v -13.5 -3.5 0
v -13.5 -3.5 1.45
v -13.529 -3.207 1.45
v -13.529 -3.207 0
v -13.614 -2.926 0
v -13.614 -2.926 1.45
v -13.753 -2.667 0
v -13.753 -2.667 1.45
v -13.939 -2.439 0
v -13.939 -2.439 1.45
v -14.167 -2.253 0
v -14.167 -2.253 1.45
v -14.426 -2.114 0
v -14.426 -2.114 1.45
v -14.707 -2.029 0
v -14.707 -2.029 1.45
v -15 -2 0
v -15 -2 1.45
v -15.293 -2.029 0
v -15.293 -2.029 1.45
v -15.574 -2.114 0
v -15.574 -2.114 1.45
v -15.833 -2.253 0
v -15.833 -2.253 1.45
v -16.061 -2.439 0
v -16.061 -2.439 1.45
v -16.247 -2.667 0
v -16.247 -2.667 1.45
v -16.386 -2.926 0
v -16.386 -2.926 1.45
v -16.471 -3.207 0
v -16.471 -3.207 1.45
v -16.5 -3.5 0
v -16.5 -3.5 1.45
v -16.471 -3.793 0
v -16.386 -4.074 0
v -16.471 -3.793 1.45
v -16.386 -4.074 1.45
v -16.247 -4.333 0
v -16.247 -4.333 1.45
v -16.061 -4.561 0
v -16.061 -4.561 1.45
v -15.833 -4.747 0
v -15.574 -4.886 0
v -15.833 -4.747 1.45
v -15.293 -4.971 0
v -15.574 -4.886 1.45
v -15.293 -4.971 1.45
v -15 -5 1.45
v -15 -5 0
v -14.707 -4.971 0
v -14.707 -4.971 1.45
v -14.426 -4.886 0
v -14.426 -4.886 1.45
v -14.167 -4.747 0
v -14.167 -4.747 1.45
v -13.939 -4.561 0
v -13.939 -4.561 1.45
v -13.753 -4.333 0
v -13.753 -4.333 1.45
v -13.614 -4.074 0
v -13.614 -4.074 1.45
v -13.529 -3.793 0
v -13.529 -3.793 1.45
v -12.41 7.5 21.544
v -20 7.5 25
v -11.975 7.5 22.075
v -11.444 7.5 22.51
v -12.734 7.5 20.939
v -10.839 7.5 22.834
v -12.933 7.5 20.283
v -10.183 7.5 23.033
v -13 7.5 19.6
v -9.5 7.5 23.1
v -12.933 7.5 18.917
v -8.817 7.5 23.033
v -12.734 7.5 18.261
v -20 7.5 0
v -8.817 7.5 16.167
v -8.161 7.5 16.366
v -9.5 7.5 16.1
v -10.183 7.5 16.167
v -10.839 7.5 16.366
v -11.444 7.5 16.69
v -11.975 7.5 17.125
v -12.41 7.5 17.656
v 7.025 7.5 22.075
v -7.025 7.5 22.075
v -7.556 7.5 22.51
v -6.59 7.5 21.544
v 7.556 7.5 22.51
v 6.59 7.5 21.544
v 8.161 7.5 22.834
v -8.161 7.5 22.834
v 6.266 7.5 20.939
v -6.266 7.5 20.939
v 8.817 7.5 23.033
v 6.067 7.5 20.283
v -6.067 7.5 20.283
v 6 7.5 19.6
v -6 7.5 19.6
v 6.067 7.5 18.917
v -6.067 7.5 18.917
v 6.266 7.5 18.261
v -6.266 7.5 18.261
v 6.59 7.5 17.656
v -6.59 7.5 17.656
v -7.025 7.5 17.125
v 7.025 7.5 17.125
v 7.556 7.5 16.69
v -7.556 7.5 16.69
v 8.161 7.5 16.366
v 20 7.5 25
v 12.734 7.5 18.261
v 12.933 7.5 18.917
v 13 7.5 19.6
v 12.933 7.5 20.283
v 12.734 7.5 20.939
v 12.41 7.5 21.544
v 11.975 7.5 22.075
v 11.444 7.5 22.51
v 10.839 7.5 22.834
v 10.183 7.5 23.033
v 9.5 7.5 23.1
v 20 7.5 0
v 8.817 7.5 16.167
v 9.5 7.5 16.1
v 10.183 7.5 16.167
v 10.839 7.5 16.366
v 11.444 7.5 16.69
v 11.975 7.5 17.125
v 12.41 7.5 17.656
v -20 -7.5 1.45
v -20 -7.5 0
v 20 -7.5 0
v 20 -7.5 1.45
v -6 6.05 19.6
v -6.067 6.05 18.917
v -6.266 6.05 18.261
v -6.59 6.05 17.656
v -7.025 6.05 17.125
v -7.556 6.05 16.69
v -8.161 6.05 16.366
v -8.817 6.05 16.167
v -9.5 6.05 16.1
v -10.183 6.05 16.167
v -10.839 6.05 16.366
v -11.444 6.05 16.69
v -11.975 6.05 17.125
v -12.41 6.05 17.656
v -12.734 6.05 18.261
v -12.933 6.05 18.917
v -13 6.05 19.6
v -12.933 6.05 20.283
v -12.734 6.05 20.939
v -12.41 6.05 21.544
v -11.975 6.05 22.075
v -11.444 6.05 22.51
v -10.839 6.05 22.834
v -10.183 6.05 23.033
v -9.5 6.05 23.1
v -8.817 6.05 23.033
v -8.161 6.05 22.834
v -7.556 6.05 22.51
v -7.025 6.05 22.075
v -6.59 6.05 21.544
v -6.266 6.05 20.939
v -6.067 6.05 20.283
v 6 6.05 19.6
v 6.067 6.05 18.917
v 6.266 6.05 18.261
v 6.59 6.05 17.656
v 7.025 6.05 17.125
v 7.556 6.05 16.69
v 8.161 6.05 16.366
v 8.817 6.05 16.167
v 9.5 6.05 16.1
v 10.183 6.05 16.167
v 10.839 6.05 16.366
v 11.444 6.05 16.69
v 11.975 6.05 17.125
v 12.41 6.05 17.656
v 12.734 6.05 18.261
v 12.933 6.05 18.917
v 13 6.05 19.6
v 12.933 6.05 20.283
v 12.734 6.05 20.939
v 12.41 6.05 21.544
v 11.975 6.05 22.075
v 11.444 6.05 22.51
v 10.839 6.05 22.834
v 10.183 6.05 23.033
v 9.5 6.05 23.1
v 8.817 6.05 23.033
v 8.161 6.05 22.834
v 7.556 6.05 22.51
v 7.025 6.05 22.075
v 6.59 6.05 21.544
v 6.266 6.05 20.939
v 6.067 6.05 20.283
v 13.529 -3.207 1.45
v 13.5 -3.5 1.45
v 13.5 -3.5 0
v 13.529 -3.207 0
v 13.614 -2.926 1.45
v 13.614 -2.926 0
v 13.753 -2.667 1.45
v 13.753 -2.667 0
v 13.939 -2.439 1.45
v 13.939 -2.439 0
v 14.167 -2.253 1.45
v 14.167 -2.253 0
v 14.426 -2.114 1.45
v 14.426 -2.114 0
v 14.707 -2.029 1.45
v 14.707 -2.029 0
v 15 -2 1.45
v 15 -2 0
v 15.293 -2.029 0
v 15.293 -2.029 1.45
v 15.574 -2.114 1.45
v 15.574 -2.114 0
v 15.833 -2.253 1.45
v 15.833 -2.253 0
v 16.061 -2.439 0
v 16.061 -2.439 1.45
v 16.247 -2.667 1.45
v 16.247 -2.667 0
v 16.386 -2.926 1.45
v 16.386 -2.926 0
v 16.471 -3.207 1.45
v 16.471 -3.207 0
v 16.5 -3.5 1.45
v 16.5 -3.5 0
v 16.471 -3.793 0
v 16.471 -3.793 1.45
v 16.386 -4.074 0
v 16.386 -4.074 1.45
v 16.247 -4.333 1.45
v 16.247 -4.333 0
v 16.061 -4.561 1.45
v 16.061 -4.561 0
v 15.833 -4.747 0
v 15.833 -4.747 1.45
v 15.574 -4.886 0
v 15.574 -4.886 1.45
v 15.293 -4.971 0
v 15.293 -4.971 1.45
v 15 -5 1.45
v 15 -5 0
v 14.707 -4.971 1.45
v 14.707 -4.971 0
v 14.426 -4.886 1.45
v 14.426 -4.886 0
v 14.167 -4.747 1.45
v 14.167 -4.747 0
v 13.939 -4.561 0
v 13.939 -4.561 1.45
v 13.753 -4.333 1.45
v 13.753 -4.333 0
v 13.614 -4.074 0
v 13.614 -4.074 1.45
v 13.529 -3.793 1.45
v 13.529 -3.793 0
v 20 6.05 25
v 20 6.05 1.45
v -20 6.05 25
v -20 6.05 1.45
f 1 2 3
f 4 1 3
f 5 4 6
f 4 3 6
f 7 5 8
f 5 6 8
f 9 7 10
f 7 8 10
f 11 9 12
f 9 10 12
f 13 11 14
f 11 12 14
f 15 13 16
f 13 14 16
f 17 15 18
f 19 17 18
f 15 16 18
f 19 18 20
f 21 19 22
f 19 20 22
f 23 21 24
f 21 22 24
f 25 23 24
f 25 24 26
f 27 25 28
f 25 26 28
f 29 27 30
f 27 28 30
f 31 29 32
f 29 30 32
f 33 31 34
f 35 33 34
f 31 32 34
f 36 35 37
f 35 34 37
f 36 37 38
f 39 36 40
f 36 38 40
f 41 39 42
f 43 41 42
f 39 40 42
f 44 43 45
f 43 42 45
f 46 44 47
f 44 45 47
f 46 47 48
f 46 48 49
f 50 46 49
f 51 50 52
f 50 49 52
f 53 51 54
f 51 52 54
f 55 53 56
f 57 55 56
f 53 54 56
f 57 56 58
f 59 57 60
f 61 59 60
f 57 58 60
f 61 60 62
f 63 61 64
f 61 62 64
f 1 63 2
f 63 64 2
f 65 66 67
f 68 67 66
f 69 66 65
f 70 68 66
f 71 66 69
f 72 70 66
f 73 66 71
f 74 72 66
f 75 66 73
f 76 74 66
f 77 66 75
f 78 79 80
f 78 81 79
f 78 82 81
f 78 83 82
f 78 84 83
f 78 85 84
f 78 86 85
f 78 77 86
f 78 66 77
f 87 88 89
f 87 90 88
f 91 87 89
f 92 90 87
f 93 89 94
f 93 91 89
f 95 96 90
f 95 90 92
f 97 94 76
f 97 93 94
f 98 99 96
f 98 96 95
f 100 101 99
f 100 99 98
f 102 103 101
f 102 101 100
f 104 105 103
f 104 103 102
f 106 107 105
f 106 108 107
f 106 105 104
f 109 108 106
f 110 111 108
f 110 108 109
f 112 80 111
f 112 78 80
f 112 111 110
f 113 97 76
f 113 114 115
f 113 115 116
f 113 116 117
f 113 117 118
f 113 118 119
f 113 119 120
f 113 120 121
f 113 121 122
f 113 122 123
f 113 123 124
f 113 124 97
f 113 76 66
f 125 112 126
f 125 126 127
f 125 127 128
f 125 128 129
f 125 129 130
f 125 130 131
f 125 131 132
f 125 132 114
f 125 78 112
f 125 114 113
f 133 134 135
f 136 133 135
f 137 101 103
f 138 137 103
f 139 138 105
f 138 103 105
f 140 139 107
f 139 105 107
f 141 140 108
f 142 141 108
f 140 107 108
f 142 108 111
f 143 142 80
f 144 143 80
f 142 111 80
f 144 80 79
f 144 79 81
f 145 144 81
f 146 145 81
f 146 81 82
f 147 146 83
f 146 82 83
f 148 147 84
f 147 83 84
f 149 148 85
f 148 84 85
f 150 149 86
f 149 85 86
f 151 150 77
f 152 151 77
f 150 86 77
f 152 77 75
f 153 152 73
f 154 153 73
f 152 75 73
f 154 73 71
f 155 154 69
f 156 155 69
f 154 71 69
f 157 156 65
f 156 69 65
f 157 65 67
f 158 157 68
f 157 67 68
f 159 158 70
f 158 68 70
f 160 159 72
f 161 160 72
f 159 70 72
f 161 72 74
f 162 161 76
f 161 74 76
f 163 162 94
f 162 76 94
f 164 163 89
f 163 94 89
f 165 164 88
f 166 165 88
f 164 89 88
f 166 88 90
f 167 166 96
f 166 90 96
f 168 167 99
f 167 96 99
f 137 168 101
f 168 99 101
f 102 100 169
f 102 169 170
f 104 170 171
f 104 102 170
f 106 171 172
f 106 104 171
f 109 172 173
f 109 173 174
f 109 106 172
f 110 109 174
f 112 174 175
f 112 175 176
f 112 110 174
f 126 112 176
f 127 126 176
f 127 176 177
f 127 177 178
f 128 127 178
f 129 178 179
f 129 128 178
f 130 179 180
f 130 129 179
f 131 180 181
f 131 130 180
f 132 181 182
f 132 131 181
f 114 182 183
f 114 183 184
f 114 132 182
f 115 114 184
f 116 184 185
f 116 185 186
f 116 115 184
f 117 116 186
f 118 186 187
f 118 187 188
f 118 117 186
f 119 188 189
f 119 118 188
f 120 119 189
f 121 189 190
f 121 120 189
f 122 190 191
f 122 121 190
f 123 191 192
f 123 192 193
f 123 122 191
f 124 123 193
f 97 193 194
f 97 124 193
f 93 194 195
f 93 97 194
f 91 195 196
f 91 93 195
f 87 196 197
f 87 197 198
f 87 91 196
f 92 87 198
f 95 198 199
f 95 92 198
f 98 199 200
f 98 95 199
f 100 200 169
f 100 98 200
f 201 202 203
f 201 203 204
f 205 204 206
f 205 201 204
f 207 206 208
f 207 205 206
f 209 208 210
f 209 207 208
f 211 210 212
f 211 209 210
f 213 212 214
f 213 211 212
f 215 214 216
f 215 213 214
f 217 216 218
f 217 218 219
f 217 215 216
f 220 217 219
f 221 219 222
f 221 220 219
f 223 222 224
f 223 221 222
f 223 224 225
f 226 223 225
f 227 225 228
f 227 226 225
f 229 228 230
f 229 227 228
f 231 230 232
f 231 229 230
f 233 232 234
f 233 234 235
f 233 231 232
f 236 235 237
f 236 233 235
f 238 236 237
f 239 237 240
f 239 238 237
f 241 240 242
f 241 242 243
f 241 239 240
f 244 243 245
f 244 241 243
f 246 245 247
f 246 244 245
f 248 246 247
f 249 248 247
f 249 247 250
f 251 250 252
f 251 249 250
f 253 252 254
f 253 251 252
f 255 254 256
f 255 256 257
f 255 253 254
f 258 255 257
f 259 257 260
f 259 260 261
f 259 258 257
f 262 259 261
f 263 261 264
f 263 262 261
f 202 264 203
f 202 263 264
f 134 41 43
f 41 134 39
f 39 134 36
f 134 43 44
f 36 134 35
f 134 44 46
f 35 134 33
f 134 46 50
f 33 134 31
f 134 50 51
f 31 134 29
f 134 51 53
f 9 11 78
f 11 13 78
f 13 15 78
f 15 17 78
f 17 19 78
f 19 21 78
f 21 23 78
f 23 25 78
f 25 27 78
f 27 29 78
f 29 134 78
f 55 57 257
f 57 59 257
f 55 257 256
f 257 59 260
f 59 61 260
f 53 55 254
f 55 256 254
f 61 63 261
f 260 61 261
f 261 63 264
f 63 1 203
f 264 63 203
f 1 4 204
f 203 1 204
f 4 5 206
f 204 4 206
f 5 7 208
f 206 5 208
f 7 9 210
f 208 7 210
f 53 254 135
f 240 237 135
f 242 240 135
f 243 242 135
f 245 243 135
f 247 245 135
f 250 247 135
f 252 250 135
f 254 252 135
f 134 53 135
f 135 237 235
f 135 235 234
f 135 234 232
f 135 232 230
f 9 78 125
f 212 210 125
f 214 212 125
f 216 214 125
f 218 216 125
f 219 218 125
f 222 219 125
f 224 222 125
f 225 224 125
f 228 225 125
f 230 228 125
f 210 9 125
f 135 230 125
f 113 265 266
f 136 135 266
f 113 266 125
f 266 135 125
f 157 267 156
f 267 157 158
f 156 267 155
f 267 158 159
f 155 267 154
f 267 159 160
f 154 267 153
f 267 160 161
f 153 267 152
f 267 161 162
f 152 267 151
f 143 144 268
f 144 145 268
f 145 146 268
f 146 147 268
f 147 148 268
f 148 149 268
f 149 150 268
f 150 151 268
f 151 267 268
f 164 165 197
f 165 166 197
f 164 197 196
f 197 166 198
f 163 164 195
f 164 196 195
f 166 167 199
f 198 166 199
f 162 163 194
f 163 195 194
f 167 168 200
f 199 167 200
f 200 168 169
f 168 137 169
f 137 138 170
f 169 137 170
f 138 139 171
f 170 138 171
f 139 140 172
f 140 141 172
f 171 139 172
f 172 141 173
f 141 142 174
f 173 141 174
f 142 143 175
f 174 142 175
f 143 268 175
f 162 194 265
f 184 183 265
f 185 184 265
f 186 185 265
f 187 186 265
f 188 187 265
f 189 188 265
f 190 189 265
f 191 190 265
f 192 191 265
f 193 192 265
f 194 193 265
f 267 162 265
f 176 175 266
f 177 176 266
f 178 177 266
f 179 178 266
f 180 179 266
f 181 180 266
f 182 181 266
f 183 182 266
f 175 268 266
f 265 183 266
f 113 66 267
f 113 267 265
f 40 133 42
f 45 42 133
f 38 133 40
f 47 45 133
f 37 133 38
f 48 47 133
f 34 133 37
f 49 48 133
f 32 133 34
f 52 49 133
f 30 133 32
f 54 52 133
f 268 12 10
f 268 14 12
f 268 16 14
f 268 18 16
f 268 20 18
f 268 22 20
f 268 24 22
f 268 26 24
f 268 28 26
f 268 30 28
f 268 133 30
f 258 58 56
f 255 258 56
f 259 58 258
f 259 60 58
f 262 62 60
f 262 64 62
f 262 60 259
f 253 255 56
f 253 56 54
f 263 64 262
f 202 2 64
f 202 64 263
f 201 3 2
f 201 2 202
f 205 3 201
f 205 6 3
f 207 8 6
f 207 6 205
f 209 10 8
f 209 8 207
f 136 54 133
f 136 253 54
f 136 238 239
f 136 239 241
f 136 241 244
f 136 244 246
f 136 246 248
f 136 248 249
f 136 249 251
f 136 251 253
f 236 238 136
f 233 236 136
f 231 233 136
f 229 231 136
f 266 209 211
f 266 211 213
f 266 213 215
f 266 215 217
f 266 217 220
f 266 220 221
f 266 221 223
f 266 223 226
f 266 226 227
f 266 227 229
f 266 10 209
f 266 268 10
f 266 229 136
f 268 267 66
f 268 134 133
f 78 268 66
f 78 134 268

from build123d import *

# Parameters (mm, degrees)
SKETCH1_W           = 40
SKETCH1_H           = 15
BOSS_EXTRUDE1_DEPTH = 1.45
SKETCH2_W           = 40
SKETCH2_H           = 1.45
BOSS_EXTRUDE2_DEPTH = 23.55
SKETCH3_R           = 1.5
CUT_EXTRUDE1_DEPTH  = 1.45
SKETCH4_R           = 3.5
CUT_EXTRUDE2_DEPTH  = 1.45


with BuildPart() as part:
    # Sketch1 → Boss-Extrude1 (new body)
    with BuildSketch(Plane.XY):
        Rectangle(SKETCH1_W, SKETCH1_H)
    extrude(amount=BOSS_EXTRUDE1_DEPTH)

    # Sketch2 → Boss-Extrude2 (add)
    with BuildSketch(Plane.XY.offset(1.45)):
        with Locations((0, 6.775)):
            Rectangle(SKETCH2_W, SKETCH2_H)
    extrude(amount=BOSS_EXTRUDE2_DEPTH)

    # Sketch3 → Cut-Extrude1 (cut)
    with BuildSketch(Plane.XY.offset(1.45)):
        with Locations((-15, -3.5)):
            Circle(SKETCH3_R)
    cut_extrude1 = extrude(amount=-CUT_EXTRUDE1_DEPTH, mode=Mode.SUBTRACT)

    # Mirror1: Cut-Extrude1 across plane
    add(cut_extrude1.mirror(Plane(origin=(0, 0, 0), x_dir=(0, 0, 1), z_dir=(1, 0, 0))), mode=Mode.SUBTRACT)

    # Sketch4 → Cut-Extrude2 (cut)
    with BuildSketch(Plane(origin=(0, 7.5, 0), x_dir=(1, 0, 0), z_dir=(0, 1, 0))):
        with Locations((-9.5, -19.6)):
            Circle(SKETCH4_R)
    cut_extrude2 = extrude(amount=-CUT_EXTRUDE2_DEPTH, mode=Mode.SUBTRACT)

    # Mirror2: Cut-Extrude2 across plane
    add(cut_extrude2.mirror(Plane(origin=(0, 0, 0), x_dir=(0, 0, 1), z_dir=(1, 0, 0))), mode=Mode.SUBTRACT)


solid = part.part
